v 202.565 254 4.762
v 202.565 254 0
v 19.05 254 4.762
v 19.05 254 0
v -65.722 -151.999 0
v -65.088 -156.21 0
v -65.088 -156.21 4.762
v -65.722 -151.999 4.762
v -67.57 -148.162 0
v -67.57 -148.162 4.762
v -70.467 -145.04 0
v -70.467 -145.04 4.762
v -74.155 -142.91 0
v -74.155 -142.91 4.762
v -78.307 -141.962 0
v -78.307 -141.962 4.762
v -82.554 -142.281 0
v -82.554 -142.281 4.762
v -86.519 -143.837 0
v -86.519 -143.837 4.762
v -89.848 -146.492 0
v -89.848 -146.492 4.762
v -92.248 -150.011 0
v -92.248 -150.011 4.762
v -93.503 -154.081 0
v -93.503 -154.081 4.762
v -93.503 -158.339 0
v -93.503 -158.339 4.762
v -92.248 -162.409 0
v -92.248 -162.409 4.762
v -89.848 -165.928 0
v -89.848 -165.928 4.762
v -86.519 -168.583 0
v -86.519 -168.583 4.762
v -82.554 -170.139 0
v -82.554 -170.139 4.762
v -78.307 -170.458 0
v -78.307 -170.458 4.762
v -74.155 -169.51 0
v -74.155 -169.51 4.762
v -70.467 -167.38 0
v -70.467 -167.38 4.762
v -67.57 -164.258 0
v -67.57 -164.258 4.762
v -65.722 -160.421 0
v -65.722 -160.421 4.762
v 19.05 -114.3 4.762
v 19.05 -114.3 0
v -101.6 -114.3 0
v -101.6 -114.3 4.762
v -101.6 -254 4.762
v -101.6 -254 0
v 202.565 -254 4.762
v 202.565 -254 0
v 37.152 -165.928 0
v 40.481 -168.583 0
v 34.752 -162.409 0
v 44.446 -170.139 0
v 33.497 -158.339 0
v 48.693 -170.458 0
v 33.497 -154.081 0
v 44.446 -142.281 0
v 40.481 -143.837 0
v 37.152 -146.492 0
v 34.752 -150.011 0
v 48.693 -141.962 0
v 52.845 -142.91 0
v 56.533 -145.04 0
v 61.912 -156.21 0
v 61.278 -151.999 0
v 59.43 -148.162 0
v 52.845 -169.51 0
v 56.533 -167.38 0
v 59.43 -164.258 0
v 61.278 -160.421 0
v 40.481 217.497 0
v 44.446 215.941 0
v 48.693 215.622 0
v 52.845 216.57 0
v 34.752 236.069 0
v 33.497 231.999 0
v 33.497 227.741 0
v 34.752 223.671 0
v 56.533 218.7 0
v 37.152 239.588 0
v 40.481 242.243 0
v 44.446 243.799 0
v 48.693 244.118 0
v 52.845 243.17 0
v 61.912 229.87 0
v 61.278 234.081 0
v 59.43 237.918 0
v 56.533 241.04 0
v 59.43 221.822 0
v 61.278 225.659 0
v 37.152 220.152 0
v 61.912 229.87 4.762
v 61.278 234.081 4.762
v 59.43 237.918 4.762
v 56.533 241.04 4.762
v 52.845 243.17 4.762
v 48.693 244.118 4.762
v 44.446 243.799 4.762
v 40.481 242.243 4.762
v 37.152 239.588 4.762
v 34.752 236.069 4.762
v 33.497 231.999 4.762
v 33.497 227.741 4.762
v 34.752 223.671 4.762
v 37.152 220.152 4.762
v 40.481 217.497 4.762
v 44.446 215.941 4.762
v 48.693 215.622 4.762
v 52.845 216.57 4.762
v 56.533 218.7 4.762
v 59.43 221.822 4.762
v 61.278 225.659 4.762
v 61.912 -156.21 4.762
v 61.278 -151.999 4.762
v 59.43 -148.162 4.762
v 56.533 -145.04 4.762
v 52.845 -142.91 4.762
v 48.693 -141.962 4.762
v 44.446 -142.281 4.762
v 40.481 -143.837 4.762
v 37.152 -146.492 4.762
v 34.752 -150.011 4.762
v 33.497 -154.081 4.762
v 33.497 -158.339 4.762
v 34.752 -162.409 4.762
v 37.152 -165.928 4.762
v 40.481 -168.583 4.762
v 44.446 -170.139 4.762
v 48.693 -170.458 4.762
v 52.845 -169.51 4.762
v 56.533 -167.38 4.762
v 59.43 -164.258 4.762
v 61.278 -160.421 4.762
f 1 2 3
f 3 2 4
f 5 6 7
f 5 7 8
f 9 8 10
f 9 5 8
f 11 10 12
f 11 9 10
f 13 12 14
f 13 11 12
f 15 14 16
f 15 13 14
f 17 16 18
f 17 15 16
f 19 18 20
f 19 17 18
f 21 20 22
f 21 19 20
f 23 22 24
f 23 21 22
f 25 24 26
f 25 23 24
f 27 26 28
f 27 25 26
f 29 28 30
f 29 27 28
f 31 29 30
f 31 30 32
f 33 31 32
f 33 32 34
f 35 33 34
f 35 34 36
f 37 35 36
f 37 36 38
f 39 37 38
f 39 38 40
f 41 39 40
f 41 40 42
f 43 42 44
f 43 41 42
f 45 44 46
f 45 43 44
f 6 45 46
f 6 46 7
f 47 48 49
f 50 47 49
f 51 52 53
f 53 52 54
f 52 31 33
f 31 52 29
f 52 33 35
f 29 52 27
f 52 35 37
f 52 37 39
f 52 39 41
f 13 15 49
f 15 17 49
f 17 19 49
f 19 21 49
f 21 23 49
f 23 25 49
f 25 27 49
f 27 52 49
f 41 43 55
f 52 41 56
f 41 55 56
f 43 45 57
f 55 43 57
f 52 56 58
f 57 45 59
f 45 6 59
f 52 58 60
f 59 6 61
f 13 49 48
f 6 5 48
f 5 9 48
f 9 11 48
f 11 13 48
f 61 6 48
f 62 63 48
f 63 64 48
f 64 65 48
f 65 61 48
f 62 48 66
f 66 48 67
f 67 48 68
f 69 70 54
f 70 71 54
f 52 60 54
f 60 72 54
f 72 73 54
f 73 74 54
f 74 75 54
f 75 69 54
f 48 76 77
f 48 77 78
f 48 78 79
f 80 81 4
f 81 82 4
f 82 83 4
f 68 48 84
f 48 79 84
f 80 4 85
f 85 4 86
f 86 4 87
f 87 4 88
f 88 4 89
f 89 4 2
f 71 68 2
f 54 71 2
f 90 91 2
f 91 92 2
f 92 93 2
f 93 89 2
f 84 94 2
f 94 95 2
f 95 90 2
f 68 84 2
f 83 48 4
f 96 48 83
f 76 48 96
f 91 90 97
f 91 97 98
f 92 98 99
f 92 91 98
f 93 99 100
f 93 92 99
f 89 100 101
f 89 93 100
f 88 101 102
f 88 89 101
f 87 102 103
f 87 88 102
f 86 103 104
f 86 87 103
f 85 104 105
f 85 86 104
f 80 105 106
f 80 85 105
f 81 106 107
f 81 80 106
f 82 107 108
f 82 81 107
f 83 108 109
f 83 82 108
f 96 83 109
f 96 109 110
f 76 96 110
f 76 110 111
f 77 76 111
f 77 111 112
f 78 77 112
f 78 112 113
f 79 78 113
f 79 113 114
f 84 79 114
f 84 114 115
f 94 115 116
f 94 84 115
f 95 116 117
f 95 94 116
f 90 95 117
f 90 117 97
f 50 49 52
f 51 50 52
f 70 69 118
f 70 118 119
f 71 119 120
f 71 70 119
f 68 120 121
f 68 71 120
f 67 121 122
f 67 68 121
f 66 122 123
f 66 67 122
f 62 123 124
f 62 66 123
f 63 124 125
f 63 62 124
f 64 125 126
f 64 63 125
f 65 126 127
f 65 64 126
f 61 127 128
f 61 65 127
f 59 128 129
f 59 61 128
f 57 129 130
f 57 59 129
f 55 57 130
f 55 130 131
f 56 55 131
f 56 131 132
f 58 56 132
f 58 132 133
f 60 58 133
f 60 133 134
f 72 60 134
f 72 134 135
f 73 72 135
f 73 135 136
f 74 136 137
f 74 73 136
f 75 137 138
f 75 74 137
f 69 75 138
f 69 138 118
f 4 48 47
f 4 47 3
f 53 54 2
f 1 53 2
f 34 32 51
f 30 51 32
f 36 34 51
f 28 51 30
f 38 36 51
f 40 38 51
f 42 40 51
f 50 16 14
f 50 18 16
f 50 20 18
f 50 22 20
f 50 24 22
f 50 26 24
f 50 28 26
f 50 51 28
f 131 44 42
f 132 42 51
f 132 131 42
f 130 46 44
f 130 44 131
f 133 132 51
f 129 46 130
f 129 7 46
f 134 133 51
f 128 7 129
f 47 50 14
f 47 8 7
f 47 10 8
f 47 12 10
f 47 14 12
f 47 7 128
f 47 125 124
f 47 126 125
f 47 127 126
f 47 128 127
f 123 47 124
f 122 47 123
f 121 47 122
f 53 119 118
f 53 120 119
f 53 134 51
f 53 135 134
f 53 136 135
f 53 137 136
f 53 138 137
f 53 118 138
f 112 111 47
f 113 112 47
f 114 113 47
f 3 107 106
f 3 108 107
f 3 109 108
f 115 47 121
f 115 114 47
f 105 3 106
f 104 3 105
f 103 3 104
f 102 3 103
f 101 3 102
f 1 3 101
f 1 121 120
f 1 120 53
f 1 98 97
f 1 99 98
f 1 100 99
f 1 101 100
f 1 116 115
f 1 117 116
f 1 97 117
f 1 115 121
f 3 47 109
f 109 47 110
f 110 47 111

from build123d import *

# Parameters (mm, degrees)
F0_R     = 14.2875
F0_W     = 82.55
F0_H     = 368.3
F1_DEPTH = 4.7625


# Not quite as in the source:
# - a feature names something its author has since deleted; it is built from what else it names


with BuildPart() as f1:
    # F0 (on Top) → F1 (new body)
    with BuildSketch(Plane.XY):
        Polygon((19.05, -114.3), (-101.6, -114.3), (-101.6, -254), (101.6, -254), (101.6, -114.3), align=None)
        with Locations((-79.375, -156.21)):
            Circle(F0_R, mode=Mode.SUBTRACT)
        with Locations((47.625, -156.21)):
            Circle(F0_R, mode=Mode.SUBTRACT)
        Polygon((202.565, 254), (101.6, 254), (101.6, -114.3), (101.6, -254), (202.565, -254), align=None)
        with Locations((60.325, 69.85)):
            Rectangle(F0_W, F0_H)
        with Locations((47.625, 229.87)):
            Circle(F0_R, mode=Mode.SUBTRACT)
    extrude(amount=F1_DEPTH)


solid = f1.part
